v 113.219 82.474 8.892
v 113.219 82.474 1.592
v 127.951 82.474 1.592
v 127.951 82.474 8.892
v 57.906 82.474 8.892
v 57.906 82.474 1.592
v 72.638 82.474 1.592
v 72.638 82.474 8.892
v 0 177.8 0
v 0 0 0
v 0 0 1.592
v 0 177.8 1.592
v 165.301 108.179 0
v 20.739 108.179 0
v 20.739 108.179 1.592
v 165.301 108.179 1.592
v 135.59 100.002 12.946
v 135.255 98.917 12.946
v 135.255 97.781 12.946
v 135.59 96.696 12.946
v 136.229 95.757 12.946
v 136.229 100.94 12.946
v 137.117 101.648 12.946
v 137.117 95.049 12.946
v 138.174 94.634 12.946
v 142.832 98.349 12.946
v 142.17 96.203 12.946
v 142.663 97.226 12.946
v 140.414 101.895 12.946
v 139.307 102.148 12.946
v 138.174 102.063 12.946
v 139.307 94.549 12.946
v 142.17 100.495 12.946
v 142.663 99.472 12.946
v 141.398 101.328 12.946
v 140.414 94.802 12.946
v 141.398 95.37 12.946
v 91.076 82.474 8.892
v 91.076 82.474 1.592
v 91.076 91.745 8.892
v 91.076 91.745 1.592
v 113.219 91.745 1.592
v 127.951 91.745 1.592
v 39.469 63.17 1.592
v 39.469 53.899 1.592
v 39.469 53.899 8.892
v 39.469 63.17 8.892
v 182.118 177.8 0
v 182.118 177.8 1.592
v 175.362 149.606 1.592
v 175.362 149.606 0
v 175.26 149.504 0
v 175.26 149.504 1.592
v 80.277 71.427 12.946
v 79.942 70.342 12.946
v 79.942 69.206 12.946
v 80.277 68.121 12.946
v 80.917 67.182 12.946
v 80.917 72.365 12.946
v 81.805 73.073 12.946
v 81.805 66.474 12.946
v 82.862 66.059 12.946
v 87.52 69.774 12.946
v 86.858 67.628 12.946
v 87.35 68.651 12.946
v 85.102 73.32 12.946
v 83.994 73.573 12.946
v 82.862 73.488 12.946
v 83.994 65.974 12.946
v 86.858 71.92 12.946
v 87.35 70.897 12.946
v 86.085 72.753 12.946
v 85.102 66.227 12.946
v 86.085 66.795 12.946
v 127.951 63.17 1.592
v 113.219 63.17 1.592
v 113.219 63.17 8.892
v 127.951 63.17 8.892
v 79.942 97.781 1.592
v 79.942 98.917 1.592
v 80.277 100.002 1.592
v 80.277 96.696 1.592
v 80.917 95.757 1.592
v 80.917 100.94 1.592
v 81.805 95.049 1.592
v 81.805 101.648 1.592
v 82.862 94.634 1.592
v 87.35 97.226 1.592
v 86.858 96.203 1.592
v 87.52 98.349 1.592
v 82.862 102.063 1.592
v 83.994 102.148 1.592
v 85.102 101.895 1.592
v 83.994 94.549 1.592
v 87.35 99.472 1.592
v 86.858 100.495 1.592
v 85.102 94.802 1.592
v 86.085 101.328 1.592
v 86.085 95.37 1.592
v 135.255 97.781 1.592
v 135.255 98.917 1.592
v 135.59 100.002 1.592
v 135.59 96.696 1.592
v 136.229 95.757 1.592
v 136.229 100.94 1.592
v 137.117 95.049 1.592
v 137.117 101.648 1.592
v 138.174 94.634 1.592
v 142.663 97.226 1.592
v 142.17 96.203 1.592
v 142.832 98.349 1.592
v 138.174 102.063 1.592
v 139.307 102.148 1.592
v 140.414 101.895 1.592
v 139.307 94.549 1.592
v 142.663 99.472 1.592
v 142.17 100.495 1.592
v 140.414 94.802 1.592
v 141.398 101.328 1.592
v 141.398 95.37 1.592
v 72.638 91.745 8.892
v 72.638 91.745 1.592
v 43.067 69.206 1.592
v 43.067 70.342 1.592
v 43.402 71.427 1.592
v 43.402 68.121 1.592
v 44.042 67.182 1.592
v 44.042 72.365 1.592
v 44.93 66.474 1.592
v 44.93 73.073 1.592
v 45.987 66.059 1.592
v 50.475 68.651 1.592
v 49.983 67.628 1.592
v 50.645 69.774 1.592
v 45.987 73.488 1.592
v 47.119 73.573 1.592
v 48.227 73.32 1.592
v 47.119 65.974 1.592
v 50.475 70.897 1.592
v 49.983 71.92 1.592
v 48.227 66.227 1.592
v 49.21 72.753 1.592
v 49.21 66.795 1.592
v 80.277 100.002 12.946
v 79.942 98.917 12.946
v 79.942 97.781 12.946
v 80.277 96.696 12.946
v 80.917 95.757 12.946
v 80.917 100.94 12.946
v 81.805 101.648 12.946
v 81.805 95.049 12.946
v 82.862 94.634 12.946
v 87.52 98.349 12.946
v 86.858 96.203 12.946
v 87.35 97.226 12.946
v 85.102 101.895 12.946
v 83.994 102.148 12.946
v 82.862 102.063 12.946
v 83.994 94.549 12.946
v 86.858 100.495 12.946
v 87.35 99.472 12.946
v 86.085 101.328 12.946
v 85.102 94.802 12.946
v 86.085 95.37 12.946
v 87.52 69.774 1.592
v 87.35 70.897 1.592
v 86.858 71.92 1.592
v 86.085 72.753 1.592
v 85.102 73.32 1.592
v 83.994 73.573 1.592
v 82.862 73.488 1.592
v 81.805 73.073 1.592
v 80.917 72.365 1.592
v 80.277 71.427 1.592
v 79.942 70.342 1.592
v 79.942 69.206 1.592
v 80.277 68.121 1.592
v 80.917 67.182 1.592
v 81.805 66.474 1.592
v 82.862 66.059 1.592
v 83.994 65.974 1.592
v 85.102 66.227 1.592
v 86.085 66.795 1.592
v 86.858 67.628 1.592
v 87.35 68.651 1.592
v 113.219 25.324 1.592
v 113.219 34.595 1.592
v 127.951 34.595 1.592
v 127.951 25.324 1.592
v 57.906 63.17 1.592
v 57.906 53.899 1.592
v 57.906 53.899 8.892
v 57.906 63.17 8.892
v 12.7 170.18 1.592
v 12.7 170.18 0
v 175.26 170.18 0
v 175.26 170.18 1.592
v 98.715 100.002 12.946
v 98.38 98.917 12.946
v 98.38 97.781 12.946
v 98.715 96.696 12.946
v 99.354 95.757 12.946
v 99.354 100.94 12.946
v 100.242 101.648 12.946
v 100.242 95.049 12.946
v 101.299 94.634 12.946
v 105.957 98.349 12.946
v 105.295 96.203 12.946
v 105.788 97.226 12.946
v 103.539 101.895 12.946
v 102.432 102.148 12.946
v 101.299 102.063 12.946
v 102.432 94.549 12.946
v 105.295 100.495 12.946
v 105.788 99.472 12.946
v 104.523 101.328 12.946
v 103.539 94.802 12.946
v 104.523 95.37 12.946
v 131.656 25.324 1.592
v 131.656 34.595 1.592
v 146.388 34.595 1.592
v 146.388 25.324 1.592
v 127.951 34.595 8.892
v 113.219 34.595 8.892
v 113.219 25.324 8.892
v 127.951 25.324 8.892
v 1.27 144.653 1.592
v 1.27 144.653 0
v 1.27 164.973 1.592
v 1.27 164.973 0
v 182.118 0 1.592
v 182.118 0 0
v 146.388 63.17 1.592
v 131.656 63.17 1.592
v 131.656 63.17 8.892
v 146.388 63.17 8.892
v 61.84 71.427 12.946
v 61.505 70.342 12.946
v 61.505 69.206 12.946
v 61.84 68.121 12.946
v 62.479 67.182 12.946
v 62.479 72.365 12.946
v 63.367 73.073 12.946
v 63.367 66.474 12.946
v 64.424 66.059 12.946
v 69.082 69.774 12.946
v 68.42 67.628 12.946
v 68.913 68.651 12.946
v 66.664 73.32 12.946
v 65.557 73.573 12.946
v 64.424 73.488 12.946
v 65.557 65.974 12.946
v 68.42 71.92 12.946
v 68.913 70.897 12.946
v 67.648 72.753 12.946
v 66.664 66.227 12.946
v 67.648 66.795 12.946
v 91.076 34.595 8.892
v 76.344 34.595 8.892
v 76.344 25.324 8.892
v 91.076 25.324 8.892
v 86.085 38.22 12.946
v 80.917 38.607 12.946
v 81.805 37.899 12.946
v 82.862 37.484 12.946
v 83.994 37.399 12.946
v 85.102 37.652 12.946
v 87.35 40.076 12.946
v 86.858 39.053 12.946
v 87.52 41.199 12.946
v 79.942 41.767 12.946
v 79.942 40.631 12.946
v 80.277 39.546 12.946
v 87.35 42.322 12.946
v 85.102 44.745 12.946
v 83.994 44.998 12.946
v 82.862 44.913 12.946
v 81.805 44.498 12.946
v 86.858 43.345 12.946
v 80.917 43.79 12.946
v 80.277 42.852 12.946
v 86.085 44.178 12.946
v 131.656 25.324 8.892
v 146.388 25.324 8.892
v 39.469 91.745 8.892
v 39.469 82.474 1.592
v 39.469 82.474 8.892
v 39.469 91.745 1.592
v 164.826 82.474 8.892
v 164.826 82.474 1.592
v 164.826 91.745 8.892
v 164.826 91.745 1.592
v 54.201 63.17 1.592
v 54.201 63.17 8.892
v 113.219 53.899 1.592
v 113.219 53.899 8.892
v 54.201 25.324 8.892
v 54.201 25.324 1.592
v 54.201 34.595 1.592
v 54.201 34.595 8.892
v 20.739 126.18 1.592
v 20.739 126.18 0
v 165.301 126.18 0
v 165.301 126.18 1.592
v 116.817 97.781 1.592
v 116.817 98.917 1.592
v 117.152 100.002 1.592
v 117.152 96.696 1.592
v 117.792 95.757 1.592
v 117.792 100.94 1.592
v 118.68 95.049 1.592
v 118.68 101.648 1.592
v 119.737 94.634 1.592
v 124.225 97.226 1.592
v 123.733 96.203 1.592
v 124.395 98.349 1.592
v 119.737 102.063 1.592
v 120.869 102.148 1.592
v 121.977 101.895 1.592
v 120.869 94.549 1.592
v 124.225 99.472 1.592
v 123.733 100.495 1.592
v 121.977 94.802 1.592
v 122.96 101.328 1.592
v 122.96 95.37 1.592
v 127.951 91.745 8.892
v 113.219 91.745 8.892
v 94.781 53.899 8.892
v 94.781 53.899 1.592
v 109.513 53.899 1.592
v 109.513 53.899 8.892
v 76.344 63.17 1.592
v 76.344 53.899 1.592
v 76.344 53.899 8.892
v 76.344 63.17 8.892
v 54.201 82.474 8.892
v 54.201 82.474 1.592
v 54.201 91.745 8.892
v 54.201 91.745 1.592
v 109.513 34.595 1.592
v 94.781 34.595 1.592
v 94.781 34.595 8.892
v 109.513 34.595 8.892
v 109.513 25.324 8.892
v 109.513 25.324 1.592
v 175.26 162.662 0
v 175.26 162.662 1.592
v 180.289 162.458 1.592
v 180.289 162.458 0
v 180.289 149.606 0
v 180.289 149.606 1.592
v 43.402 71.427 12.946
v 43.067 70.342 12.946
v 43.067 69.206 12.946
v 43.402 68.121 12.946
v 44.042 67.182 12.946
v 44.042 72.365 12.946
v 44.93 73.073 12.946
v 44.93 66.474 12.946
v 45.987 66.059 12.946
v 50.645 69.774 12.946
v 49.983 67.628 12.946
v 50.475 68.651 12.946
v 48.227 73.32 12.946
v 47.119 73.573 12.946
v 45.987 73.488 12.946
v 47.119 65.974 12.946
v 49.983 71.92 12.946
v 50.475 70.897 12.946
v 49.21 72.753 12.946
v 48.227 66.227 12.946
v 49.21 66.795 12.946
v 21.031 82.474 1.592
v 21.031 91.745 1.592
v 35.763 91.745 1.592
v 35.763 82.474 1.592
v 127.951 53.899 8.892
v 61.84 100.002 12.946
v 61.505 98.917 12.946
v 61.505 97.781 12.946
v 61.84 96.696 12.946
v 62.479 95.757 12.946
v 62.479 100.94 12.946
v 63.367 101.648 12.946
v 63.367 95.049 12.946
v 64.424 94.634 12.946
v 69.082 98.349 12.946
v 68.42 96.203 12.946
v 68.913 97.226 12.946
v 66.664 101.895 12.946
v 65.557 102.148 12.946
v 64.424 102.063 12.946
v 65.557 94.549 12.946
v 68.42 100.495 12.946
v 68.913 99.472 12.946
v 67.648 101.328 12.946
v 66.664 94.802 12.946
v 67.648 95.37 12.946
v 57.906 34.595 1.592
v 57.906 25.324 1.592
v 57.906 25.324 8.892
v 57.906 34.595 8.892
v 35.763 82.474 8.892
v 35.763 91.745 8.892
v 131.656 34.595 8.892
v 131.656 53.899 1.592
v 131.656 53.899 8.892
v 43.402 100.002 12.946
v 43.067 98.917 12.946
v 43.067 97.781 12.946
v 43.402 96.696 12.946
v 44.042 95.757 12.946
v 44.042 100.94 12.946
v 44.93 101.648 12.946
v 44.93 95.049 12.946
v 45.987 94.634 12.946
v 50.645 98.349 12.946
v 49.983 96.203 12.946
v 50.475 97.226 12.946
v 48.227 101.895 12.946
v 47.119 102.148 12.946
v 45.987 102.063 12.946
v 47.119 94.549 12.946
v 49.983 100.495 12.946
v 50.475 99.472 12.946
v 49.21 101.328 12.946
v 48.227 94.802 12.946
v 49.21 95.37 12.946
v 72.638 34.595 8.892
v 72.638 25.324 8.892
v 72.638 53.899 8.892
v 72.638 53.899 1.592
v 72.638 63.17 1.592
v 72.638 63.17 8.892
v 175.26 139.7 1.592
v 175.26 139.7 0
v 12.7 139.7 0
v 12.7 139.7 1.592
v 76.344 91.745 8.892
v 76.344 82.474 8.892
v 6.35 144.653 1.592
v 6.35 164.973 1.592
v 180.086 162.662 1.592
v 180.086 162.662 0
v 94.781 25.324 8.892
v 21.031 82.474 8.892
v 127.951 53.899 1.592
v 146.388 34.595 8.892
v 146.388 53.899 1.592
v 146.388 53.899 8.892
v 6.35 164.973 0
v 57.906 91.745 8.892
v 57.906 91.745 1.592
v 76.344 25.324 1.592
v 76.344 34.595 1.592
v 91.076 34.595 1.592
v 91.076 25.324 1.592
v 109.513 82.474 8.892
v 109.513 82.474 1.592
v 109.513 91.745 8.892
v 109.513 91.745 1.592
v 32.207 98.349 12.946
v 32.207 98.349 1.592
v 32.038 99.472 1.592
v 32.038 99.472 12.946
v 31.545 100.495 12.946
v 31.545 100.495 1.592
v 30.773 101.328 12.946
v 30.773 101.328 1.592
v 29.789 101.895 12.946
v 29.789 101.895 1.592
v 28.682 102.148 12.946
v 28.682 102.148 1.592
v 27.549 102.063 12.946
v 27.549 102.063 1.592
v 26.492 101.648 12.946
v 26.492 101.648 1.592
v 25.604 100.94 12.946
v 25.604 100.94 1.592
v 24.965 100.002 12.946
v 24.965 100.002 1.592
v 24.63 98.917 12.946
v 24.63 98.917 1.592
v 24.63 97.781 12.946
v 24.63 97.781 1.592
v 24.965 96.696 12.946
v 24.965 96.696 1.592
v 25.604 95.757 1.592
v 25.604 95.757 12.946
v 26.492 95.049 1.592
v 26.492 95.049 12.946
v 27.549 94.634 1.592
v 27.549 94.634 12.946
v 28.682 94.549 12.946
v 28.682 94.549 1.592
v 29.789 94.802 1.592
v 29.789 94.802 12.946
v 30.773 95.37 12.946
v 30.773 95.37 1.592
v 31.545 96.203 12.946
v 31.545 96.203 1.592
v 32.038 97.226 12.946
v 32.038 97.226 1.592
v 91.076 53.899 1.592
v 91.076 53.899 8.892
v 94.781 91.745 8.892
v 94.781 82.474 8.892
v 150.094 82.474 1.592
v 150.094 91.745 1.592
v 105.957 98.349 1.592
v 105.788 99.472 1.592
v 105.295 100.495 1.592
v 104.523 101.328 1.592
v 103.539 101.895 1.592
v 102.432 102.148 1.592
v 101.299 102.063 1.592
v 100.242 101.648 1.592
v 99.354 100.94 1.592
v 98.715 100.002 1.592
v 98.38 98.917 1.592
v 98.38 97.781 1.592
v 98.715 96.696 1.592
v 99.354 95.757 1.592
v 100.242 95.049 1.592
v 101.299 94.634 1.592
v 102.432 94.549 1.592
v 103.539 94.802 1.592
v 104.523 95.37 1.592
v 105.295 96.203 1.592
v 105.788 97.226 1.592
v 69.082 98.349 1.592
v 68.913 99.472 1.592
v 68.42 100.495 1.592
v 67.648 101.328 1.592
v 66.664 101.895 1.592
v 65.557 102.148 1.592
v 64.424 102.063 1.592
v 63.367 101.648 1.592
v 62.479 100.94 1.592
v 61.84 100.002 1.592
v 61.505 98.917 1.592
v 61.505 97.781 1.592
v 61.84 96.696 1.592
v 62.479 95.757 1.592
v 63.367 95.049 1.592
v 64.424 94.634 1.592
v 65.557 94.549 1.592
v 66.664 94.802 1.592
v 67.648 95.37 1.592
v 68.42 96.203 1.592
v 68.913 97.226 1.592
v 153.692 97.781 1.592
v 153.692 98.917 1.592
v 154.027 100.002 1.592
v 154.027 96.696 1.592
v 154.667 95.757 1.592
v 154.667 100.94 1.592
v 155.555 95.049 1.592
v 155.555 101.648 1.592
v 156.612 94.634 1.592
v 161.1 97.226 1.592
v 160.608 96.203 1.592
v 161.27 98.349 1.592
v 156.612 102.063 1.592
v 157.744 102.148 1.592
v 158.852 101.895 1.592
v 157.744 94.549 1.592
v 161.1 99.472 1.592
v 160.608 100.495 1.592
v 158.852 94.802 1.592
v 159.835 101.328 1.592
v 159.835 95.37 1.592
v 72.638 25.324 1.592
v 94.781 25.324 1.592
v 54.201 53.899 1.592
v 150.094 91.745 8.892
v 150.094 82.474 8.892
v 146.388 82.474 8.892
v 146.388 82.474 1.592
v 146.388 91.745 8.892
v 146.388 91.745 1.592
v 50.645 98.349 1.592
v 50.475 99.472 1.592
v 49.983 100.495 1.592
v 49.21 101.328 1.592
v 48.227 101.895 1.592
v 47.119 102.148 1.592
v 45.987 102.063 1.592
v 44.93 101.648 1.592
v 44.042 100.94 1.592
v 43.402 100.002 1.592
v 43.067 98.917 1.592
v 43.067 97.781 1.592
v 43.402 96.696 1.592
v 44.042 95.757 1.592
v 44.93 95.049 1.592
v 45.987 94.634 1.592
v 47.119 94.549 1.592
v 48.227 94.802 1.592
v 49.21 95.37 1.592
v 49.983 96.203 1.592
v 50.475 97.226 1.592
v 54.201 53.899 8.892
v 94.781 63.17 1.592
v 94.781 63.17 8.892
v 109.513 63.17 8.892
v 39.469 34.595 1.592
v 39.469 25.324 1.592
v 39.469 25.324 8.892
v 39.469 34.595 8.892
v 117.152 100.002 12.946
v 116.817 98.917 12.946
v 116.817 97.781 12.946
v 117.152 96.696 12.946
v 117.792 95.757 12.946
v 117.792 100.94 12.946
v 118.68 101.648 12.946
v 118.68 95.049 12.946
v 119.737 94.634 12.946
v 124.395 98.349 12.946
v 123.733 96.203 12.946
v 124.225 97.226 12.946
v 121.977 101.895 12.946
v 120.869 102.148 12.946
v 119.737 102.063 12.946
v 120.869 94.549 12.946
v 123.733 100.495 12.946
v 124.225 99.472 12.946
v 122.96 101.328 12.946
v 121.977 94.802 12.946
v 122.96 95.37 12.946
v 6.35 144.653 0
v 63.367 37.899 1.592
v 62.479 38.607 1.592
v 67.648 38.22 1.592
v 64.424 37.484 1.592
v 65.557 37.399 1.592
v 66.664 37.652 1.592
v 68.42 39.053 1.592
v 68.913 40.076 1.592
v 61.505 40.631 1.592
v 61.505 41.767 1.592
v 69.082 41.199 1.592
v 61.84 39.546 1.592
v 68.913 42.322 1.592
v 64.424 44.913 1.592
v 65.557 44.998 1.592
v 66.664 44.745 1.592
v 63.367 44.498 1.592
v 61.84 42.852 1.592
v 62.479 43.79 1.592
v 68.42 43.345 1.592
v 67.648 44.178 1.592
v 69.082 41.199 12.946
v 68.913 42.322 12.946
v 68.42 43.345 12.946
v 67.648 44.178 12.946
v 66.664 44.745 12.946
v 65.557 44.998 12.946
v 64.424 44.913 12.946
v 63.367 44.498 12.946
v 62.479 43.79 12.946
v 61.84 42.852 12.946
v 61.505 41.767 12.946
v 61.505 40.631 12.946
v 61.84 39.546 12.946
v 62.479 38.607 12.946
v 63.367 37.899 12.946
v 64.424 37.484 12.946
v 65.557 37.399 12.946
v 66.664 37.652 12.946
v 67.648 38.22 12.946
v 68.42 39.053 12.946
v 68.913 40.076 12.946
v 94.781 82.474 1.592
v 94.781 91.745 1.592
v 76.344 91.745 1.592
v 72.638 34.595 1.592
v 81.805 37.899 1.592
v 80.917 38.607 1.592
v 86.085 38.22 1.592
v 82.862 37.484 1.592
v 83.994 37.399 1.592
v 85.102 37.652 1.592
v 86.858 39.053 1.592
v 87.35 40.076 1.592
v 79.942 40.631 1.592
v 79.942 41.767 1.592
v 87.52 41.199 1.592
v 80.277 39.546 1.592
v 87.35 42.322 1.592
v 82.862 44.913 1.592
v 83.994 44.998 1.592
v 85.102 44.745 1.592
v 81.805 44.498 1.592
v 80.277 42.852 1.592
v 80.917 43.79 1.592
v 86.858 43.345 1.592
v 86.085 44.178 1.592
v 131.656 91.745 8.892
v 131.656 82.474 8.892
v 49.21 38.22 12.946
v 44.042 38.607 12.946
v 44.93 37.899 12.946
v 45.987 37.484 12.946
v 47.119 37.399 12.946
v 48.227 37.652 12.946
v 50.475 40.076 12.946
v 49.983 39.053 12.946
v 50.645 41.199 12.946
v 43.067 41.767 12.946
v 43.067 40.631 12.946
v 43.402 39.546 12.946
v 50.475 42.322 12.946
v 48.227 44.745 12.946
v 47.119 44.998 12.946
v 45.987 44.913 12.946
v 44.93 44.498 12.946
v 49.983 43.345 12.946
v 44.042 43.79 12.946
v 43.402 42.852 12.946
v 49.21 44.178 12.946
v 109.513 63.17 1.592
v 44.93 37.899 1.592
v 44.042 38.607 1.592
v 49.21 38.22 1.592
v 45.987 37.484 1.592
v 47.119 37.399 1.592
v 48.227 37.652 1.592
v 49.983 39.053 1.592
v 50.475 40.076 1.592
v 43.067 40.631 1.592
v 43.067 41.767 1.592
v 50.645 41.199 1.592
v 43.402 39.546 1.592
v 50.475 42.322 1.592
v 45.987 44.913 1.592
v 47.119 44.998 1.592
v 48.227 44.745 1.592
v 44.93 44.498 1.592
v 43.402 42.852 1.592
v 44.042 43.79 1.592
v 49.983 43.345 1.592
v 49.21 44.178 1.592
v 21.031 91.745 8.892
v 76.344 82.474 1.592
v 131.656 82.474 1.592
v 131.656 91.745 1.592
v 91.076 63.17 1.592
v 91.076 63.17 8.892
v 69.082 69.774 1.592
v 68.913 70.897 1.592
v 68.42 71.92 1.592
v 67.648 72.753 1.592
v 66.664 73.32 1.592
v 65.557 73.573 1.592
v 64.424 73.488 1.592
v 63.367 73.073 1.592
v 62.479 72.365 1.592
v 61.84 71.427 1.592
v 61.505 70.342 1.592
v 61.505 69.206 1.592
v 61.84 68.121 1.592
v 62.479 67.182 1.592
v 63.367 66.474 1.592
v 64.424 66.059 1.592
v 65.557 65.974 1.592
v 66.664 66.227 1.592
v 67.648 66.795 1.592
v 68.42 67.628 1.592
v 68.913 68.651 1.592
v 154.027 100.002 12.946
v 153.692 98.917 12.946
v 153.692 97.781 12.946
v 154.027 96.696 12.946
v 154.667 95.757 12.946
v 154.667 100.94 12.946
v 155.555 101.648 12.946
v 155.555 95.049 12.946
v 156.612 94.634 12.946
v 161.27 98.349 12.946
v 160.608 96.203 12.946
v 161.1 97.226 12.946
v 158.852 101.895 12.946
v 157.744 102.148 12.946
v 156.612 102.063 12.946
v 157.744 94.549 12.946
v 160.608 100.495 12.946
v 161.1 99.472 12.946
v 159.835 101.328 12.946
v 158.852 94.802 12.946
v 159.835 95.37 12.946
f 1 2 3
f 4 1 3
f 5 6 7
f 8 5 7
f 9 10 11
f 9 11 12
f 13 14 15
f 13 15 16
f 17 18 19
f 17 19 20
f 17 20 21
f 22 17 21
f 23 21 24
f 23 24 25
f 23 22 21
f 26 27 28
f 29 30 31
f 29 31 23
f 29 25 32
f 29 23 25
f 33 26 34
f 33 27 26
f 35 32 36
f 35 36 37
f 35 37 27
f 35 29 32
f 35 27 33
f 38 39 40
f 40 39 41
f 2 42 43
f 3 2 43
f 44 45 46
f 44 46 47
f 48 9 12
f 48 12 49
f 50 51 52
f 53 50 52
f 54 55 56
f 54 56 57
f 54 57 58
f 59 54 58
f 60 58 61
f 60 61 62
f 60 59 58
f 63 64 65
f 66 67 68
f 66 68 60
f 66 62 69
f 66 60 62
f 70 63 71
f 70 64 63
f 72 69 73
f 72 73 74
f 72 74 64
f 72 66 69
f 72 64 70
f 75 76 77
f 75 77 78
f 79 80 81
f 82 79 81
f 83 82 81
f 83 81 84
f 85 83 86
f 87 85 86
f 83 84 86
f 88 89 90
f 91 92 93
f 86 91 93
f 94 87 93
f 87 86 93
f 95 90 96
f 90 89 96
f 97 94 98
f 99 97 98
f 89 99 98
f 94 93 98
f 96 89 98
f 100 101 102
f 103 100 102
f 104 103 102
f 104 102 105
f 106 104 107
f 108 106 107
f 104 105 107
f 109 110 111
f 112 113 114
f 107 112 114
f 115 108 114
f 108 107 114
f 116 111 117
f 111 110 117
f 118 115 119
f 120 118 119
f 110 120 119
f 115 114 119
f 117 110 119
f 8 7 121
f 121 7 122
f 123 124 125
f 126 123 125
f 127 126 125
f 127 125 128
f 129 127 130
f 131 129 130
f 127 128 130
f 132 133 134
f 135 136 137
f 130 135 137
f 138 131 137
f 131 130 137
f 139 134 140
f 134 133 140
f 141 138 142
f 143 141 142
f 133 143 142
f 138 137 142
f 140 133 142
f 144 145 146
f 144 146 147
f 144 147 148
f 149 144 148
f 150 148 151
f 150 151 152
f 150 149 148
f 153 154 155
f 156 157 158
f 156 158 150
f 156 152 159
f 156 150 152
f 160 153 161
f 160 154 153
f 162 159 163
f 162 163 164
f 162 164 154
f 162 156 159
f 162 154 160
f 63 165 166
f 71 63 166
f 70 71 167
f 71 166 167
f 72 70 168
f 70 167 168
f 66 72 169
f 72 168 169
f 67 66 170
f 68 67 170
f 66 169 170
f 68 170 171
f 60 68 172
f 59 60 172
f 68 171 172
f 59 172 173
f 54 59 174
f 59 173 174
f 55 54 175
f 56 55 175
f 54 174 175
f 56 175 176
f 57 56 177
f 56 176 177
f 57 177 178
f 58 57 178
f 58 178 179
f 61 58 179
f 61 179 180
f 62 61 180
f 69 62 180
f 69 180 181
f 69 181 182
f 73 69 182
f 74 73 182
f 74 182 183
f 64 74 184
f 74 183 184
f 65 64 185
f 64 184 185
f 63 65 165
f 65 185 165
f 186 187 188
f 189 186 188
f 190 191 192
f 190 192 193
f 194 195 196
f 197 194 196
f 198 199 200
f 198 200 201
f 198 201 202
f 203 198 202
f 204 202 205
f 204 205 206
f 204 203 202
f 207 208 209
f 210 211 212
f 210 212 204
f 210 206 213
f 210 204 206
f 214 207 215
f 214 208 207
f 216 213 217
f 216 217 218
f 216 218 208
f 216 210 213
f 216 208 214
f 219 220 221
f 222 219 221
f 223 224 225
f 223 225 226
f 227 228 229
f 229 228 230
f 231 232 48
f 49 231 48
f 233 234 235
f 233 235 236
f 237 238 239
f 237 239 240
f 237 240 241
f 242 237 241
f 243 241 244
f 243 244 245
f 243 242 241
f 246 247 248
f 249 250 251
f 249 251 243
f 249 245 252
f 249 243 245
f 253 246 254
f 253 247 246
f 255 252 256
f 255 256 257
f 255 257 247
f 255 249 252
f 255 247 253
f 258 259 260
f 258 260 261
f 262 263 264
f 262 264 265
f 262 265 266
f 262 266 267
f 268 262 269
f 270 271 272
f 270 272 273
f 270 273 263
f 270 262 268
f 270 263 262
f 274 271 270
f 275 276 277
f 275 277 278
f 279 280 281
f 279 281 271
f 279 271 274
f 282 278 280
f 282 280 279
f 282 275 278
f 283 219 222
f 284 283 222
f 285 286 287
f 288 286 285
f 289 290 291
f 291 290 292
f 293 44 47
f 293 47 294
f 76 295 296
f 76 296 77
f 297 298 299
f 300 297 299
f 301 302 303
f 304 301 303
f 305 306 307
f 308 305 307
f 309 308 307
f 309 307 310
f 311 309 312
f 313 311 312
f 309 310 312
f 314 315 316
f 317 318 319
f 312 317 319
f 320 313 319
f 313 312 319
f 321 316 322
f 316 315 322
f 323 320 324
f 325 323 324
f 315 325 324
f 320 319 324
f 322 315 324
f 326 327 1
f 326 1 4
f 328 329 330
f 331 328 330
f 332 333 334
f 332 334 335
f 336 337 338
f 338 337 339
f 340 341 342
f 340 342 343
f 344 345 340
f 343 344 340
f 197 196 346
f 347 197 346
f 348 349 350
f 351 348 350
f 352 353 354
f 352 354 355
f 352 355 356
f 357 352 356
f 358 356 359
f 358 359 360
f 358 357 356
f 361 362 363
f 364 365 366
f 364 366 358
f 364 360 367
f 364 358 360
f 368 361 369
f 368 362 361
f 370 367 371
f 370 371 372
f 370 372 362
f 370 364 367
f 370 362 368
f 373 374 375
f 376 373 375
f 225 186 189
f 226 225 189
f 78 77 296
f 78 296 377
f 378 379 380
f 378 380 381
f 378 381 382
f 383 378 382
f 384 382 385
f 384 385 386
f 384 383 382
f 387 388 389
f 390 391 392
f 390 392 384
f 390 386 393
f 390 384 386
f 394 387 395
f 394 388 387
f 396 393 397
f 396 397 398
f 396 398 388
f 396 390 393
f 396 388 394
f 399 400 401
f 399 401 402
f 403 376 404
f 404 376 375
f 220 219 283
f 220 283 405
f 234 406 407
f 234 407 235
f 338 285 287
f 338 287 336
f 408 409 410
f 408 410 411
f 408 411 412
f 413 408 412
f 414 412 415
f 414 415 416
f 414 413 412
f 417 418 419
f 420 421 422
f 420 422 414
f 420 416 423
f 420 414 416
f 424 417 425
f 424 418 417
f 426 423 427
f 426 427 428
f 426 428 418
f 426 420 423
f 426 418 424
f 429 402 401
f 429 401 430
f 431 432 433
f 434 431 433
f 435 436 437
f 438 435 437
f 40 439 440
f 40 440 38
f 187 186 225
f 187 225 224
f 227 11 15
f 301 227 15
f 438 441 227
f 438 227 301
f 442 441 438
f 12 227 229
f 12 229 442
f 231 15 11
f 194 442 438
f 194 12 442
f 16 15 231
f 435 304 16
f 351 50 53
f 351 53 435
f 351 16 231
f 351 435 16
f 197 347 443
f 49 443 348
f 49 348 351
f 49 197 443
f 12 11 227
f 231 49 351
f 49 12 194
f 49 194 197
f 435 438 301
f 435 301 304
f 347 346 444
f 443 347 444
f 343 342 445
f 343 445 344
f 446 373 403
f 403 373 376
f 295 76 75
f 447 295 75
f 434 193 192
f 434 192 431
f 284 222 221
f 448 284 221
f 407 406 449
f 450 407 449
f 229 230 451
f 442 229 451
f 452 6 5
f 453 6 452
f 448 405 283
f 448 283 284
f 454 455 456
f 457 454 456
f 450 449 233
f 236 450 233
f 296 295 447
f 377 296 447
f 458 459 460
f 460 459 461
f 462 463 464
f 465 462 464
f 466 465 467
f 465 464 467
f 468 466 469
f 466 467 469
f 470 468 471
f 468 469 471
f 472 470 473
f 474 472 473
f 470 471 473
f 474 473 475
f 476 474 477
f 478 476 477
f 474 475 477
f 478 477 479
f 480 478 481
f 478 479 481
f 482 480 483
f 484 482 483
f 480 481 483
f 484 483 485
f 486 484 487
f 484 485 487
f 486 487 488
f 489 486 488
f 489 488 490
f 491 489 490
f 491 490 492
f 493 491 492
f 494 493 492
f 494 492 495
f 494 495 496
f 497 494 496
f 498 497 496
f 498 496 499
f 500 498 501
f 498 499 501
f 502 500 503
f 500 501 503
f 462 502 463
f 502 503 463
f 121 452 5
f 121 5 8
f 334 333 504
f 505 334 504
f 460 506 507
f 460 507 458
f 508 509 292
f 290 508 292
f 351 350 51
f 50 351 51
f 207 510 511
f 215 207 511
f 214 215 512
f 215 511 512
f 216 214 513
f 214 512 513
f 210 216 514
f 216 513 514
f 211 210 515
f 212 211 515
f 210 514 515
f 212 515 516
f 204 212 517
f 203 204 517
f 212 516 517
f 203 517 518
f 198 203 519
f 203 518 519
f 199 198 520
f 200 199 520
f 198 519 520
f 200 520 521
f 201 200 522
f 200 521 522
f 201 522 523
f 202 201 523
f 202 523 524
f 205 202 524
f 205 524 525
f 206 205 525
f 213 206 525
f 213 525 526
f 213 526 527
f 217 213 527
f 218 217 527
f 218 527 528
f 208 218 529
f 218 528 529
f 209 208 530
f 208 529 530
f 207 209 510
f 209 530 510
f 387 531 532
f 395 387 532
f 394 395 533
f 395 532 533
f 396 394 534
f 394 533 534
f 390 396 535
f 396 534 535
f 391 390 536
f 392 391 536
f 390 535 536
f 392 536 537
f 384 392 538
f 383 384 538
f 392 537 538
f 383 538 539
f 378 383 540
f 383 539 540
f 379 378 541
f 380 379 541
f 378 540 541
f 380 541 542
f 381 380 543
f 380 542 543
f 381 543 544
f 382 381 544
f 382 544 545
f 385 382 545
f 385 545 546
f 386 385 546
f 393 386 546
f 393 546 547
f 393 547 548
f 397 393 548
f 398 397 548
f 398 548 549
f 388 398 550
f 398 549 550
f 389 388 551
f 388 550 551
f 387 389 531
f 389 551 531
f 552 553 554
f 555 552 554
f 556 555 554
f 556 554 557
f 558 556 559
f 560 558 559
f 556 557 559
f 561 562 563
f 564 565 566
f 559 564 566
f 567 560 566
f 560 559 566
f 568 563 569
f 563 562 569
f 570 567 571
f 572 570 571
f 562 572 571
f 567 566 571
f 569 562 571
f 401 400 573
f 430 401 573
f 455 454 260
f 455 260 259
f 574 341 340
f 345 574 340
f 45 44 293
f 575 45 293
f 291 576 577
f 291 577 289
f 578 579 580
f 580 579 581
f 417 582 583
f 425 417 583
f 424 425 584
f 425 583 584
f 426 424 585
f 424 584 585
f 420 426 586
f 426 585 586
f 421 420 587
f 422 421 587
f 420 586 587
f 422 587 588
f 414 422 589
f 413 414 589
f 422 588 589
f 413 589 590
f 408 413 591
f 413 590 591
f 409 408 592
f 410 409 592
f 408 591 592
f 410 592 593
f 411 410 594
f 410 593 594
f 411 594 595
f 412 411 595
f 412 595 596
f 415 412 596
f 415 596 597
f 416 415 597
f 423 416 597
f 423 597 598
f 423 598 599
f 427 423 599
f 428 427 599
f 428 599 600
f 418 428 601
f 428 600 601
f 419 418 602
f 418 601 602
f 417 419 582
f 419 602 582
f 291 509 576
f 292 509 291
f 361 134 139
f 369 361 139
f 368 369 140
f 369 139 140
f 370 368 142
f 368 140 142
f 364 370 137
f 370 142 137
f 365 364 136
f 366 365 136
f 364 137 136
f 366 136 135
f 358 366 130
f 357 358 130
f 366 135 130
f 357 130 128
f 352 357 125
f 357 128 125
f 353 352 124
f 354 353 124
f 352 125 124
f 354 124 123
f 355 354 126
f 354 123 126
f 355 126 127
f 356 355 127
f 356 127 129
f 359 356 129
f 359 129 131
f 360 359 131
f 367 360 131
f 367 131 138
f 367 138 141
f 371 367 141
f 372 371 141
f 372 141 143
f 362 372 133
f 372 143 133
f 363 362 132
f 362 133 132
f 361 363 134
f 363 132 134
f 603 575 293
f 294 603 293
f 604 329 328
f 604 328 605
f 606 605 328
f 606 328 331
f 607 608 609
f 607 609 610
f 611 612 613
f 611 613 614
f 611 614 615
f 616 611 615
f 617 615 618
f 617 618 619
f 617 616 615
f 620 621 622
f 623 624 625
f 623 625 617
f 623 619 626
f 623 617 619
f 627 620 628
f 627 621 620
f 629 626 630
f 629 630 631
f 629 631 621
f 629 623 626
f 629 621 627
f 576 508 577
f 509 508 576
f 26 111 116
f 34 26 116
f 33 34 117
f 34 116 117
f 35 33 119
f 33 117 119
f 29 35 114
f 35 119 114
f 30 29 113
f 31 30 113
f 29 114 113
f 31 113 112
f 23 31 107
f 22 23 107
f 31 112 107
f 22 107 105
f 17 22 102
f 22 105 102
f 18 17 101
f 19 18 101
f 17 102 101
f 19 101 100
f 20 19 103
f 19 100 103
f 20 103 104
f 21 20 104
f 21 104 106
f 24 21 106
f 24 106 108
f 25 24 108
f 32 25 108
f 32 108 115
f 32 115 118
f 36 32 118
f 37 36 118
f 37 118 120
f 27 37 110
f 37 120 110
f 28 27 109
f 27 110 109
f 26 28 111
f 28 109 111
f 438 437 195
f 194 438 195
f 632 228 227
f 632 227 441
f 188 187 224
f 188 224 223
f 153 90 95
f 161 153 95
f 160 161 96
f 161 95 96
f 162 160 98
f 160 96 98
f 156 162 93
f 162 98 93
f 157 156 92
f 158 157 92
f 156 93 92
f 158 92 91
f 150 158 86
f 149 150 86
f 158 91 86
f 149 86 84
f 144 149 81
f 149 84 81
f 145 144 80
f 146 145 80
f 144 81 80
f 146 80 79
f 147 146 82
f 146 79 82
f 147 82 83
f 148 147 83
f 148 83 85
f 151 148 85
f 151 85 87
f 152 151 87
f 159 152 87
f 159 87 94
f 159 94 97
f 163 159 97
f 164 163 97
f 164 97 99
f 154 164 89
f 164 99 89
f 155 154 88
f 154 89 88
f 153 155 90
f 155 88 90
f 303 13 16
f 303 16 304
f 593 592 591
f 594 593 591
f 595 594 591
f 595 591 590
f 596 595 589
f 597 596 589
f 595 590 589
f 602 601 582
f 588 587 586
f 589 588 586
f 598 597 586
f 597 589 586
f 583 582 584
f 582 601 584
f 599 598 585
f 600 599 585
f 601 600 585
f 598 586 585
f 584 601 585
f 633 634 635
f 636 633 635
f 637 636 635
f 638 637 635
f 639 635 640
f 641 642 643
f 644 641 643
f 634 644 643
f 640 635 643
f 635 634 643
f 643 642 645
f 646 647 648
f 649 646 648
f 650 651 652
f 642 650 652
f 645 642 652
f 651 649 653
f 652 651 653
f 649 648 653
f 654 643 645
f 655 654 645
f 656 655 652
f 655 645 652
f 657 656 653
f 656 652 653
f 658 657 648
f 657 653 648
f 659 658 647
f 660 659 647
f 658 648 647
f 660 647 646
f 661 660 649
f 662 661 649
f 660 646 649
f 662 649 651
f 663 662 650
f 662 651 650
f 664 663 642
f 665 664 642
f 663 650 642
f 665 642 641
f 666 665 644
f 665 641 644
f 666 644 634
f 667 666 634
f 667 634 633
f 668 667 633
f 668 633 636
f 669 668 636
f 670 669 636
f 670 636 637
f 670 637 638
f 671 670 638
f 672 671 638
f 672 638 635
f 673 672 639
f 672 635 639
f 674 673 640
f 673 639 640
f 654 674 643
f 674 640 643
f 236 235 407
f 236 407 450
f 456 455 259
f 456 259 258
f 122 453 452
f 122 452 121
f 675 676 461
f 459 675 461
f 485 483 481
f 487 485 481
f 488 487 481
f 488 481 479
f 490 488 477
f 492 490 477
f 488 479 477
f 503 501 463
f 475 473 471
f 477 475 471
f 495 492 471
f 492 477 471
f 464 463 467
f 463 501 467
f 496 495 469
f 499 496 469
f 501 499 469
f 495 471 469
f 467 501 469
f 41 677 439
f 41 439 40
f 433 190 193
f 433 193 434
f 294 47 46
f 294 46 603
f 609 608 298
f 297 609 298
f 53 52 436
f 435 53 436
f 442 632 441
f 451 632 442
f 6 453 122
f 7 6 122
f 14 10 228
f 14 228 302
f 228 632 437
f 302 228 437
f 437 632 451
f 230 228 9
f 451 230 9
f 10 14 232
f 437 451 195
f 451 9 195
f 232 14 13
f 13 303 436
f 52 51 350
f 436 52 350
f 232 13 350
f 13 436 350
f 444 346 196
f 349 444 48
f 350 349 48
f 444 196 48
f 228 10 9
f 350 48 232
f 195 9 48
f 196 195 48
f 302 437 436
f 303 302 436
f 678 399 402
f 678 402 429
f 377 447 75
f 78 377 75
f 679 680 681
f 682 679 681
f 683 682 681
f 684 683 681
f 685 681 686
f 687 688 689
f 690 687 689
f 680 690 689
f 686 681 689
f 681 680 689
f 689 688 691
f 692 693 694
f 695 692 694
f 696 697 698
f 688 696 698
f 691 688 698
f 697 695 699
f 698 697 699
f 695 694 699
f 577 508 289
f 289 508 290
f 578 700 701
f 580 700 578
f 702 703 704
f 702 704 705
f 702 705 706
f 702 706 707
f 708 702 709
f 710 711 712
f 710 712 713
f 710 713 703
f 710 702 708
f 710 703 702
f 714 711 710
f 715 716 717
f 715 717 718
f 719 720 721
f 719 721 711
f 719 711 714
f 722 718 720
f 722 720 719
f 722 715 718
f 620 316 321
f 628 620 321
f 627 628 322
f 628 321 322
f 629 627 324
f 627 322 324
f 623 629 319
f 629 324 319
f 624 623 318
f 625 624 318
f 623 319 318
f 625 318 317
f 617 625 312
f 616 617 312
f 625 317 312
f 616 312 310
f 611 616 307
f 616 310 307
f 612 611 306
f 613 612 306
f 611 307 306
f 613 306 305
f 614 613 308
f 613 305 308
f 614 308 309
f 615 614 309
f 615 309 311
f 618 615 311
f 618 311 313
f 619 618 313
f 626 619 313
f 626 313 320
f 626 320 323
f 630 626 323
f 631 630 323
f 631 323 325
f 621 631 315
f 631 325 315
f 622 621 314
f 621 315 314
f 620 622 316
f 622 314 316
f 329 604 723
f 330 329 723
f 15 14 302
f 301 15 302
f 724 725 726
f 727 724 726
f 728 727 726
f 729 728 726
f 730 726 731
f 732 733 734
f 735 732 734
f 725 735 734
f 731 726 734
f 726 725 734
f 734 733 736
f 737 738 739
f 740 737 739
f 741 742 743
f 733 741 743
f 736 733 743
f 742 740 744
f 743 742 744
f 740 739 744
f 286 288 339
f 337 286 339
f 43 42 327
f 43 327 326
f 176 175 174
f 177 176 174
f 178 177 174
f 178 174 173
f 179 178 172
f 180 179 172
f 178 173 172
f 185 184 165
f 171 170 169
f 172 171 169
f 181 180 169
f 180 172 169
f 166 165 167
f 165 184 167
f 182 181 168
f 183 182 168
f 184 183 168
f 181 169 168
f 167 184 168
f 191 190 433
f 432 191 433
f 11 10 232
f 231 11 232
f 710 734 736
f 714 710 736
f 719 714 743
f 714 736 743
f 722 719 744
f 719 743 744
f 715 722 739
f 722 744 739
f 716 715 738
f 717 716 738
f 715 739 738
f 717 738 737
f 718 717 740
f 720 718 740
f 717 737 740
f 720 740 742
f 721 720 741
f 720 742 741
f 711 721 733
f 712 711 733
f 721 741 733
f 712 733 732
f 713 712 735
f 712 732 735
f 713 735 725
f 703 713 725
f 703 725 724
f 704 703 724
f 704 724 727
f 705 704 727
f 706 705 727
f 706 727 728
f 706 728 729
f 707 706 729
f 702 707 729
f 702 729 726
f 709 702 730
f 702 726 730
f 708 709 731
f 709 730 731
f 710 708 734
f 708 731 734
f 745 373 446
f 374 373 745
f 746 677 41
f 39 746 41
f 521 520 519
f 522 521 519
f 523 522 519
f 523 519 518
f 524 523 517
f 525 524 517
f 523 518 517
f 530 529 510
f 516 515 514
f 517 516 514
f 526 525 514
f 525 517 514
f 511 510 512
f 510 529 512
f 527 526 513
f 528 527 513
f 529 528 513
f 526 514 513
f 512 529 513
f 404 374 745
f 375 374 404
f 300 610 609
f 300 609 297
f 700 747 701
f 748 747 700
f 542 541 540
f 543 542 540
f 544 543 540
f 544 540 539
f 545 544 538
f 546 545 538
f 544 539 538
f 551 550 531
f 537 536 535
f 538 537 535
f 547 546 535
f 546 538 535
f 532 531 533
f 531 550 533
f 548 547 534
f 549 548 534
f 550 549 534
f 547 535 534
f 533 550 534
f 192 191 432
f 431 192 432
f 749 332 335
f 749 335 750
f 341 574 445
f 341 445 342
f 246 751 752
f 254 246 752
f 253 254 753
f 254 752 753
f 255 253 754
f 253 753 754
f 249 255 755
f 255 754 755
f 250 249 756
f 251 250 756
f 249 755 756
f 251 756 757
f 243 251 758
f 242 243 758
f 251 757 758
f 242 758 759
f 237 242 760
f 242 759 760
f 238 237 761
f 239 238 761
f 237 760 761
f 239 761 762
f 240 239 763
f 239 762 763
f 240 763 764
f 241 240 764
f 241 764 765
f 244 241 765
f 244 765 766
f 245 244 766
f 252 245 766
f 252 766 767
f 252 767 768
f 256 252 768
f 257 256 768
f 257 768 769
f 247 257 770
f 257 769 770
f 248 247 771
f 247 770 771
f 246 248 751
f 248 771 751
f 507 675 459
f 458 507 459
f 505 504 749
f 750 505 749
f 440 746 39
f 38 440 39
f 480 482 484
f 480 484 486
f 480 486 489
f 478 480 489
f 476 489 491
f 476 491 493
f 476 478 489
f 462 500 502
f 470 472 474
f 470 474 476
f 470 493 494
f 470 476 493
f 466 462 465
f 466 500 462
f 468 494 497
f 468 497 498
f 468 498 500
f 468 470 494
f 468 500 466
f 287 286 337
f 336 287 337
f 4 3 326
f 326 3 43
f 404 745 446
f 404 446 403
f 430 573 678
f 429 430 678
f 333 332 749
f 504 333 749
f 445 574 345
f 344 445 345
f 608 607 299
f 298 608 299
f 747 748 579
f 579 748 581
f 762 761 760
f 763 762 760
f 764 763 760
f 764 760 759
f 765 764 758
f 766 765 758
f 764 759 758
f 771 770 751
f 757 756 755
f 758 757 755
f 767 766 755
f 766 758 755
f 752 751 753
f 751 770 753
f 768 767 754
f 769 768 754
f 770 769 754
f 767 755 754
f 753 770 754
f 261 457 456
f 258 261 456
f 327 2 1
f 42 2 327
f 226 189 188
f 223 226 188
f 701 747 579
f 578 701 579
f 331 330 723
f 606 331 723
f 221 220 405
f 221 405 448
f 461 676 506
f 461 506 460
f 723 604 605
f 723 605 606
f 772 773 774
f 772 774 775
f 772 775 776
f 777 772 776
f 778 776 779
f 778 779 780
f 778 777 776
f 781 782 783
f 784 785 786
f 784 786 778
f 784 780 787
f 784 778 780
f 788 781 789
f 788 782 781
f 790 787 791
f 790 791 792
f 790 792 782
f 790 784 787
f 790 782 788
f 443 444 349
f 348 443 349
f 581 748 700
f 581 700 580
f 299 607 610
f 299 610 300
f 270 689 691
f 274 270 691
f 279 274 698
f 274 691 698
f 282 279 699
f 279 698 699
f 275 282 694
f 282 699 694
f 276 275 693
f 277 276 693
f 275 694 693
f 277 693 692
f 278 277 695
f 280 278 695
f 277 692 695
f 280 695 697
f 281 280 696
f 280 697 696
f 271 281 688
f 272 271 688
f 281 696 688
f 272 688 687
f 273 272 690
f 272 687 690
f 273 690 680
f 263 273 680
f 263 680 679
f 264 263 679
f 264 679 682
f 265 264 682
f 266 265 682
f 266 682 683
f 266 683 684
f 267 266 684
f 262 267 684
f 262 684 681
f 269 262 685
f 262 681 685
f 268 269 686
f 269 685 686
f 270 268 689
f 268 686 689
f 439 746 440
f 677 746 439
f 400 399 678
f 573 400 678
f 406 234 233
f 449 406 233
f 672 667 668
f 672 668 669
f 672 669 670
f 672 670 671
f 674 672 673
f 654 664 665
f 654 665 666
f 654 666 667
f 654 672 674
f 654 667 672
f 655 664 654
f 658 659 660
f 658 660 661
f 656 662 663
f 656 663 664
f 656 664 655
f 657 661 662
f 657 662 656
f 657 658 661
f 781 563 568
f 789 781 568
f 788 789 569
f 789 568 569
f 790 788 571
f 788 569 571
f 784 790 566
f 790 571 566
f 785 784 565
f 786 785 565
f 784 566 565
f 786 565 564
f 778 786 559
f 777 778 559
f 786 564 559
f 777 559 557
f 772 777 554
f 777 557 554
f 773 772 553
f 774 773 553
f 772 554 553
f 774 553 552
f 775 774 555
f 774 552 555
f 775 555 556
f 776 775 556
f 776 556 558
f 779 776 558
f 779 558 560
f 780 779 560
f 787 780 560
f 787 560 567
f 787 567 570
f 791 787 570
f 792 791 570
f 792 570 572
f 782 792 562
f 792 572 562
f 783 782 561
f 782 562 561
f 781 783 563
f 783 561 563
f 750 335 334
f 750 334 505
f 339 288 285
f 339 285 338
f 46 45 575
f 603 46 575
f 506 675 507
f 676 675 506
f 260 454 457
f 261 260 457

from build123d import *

# Parameters (mm, degrees)
SKETCH1_W                       = 182.118
SKETCH1_H                       = 177.8
SKETCH1_W_2                     = 144.56156
SKETCH1_H_2                     = 18.00098
SKETCH1_W_3                     = 5.08
SKETCH1_H_3                     = 20.32
BOARD_DEPTH                     = 1.592072
SKETCH2_R                       = 3.81
LED_KINGBRIGHT_3P_2P54_1_DEPTH  = 11.3538
SKETCH3_R                       = 3.81
LED_KINGBRIGHT_3P_2P54_2_DEPTH  = 11.3538
SKETCH4_R                       = 3.81
LED_KINGBRIGHT_3P_2P54_3_DEPTH  = 11.3538
SKETCH6_R                       = 3.81
LED_KINGBRIGHT_3P_2P54_5_DEPTH  = 11.3538
SKETCH7_R                       = 3.81
LED_KINGBRIGHT_3P_2P54_6_DEPTH  = 11.3538
SKETCH8_R                       = 3.81
LED_KINGBRIGHT_3P_2P54_7_DEPTH  = 11.3538
SKETCH10_R                      = 3.81
LED_KINGBRIGHT_3P_2P54_9_DEPTH  = 11.3538
SKETCH11_R                      = 3.81
LED_KINGBRIGHT_3P_2P54_10_DEPTH = 11.3538
SKETCH12_R                      = 3.81
LED_KINGBRIGHT_3P_2P54_11_DEPTH = 11.3538
SKETCH13_R                      = 3.81
LED_KINGBRIGHT_3P_2P54_12_DEPTH = 11.3538
SKETCH14_R                      = 3.81
LED_KINGBRIGHT_3P_2P54_13_DEPTH = 11.3538
SKETCH15_R                      = 3.81
LED_KINGBRIGHT_3P_2P54_14_DEPTH = 11.3538
SKETCH16_R                      = 3.81
LED_KINGBRIGHT_3P_2P54_15_DEPTH = 11.3538
SKETCH17_R                      = 3.81
LED_KINGBRIGHT_3P_2P54_16_DEPTH = 11.3538
SKETCH18_W                      = 14.732
SKETCH18_H                      = 9.271
SWITCH_MCDTS2_1_DEPTH           = 7.3000108
SKETCH19_W                      = 14.732
SKETCH19_H                      = 9.271
SWITCH_MCDTS2_2_DEPTH           = 7.3000108
SKETCH20_W                      = 14.732
SKETCH20_H                      = 9.271
SWITCH_MCDTS2_3_DEPTH           = 7.3000108
SKETCH21_W                      = 14.732
SKETCH21_H                      = 9.271
SWITCH_MCDTS2_4_DEPTH           = 7.3000108
SKETCH22_W                      = 14.732
SKETCH22_H                      = 9.271
SWITCH_MCDTS2_5_DEPTH           = 7.3000108
SKETCH23_W                      = 14.732
SKETCH23_H                      = 9.271
SWITCH_MCDTS2_6_DEPTH           = 7.3000108
SKETCH25_W                      = 14.732
SKETCH25_H                      = 9.271
SWITCH_MCDTS2_8_DEPTH           = 7.3000108
SKETCH26_W                      = 14.732
SKETCH26_H                      = 9.271
SWITCH_MCDTS2_9_DEPTH           = 7.3000108
SKETCH27_W                      = 14.732
SKETCH27_H                      = 9.271
SWITCH_MCDTS2_10_DEPTH          = 7.3000108
SKETCH28_W                      = 14.732
SKETCH28_H                      = 9.271
SWITCH_MCDTS2_11_DEPTH          = 7.3000108
SKETCH29_W                      = 14.732
SKETCH29_H                      = 9.271
SWITCH_MCDTS2_12_DEPTH          = 7.3000108
SKETCH30_W                      = 14.732
SKETCH30_H                      = 9.271
SWITCH_MCDTS2_13_DEPTH          = 7.3000108
SKETCH32_W                      = 14.732
SKETCH32_H                      = 9.271
SWITCH_MCDTS2_15_DEPTH          = 7.3000108
SKETCH33_W                      = 14.732
SKETCH33_H                      = 9.271
SWITCH_MCDTS2_16_DEPTH          = 7.3000108
SKETCH34_W                      = 14.732
SKETCH34_H                      = 9.271
SWITCH_MCDTS2_17_DEPTH          = 7.3000108
SKETCH35_W                      = 14.732
SKETCH35_H                      = 9.271
SWITCH_MCDTS2_18_DEPTH          = 7.3000108
SKETCH36_W                      = 14.732
SKETCH36_H                      = 9.271
SWITCH_MCDTS2_19_DEPTH          = 7.3000108
SKETCH37_W                      = 14.732
SKETCH37_H                      = 9.271
SWITCH_MCDTS2_20_DEPTH          = 7.3000108
SKETCH38_W                      = 14.732
SKETCH38_H                      = 9.271
SWITCH_MCDTS2_21_DEPTH          = 7.3000108
SKETCH39_W                      = 14.732
SKETCH39_H                      = 9.271
SWITCH_MCDTS2_22_DEPTH          = 7.3000108


with BuildPart() as part:
    # Sketch1 → BOARD (new body)
    with BuildSketch(Plane.XY):
        with Locations((91.059, 88.9)):
            Rectangle(SKETCH1_W, SKETCH1_H)
        with Locations((93.01988, 117.17909)):
            Rectangle(SKETCH1_W_2, SKETCH1_H_2, mode=Mode.SUBTRACT)
        with Locations((3.81, 154.813)):
            Rectangle(SKETCH1_W_3, SKETCH1_H_3, mode=Mode.SUBTRACT)
        Polygon((12.7, 139.7), (12.7, 170.18), (175.26, 170.18), (175.26, 162.6616), (180.086, 162.6616), (180.2892, 162.4584), (180.2892, 149.606), (175.3616, 149.606), (175.26, 149.5044), (175.26, 139.7), align=None, mode=Mode.SUBTRACT)
    extrude(amount=BOARD_DEPTH)


with BuildPart() as body_2:
    # Sketch2 → LED-KINGBRIGHT_3P_2P54-1 (new body)
    with BuildSketch(Plane.XY.offset(1.592072)):
        with Locations((83.7097132, 41.1988)):
            Circle(SKETCH2_R)
    extrude(amount=LED_KINGBRIGHT_3P_2P54_1_DEPTH)


with BuildPart() as body_3:
    # Sketch3 → LED-KINGBRIGHT_3P_2P54-2 (new body)
    with BuildSketch(Plane.XY.offset(1.592072)):
        with Locations((65.2722088, 41.1988)):
            Circle(SKETCH3_R)
    extrude(amount=LED_KINGBRIGHT_3P_2P54_2_DEPTH)


with BuildPart() as body_4:
    # Sketch4 → LED-KINGBRIGHT_3P_2P54-3 (new body)
    with BuildSketch(Plane.XY.offset(1.592072)):
        with Locations((46.8347044, 41.1988)):
            Circle(SKETCH4_R)
    extrude(amount=LED_KINGBRIGHT_3P_2P54_3_DEPTH)


with BuildPart() as body_5:
    # Sketch6 → LED-KINGBRIGHT_3P_2P54-5 (new body)
    with BuildSketch(Plane.XY.offset(1.592072)):
        with Locations((83.7097132, 69.7738)):
            Circle(SKETCH6_R)
    extrude(amount=LED_KINGBRIGHT_3P_2P54_5_DEPTH)


with BuildPart() as body_6:
    # Sketch7 → LED-KINGBRIGHT_3P_2P54-6 (new body)
    with BuildSketch(Plane.XY.offset(1.592072)):
        with Locations((65.2722088, 69.7738)):
            Circle(SKETCH7_R)
    extrude(amount=LED_KINGBRIGHT_3P_2P54_6_DEPTH)


with BuildPart() as body_7:
    # Sketch8 → LED-KINGBRIGHT_3P_2P54-7 (new body)
    with BuildSketch(Plane.XY.offset(1.592072)):
        with Locations((46.8347044, 69.7738)):
            Circle(SKETCH8_R)
    extrude(amount=LED_KINGBRIGHT_3P_2P54_7_DEPTH)


with BuildPart() as body_8:
    # Sketch10 → LED-KINGBRIGHT_3P_2P54-9 (new body)
    with BuildSketch(Plane.XY.offset(1.592072)):
        with Locations((157.4597308, 98.3488)):
            Circle(SKETCH10_R)
    extrude(amount=LED_KINGBRIGHT_3P_2P54_9_DEPTH)


with BuildPart() as body_9:
    # Sketch11 → LED-KINGBRIGHT_3P_2P54-10 (new body)
    with BuildSketch(Plane.XY.offset(1.592072)):
        with Locations((139.0222264, 98.3488)):
            Circle(SKETCH11_R)
    extrude(amount=LED_KINGBRIGHT_3P_2P54_10_DEPTH)


with BuildPart() as body_10:
    # Sketch12 → LED-KINGBRIGHT_3P_2P54-11 (new body)
    with BuildSketch(Plane.XY.offset(1.592072)):
        with Locations((120.584722, 98.3488)):
            Circle(SKETCH12_R)
    extrude(amount=LED_KINGBRIGHT_3P_2P54_11_DEPTH)


with BuildPart() as body_11:
    # Sketch13 → LED-KINGBRIGHT_3P_2P54-12 (new body)
    with BuildSketch(Plane.XY.offset(1.592072)):
        with Locations((102.1472176, 98.3488)):
            Circle(SKETCH13_R)
    extrude(amount=LED_KINGBRIGHT_3P_2P54_12_DEPTH)


with BuildPart() as body_12:
    # Sketch14 → LED-KINGBRIGHT_3P_2P54-13 (new body)
    with BuildSketch(Plane.XY.offset(1.592072)):
        with Locations((83.7097132, 98.3488)):
            Circle(SKETCH14_R)
    extrude(amount=LED_KINGBRIGHT_3P_2P54_13_DEPTH)


with BuildPart() as body_13:
    # Sketch15 → LED-KINGBRIGHT_3P_2P54-14 (new body)
    with BuildSketch(Plane.XY.offset(1.592072)):
        with Locations((65.2722088, 98.3488)):
            Circle(SKETCH15_R)
    extrude(amount=LED_KINGBRIGHT_3P_2P54_14_DEPTH)


with BuildPart() as body_14:
    # Sketch16 → LED-KINGBRIGHT_3P_2P54-15 (new body)
    with BuildSketch(Plane.XY.offset(1.592072)):
        with Locations((46.8347044, 98.3488)):
            Circle(SKETCH16_R)
    extrude(amount=LED_KINGBRIGHT_3P_2P54_15_DEPTH)


with BuildPart() as body_15:
    # Sketch17 → LED-KINGBRIGHT_3P_2P54-16 (new body)
    with BuildSketch(Plane.XY.offset(1.592072)):
        with Locations((28.3972, 98.3488)):
            Circle(SKETCH17_R)
    extrude(amount=LED_KINGBRIGHT_3P_2P54_16_DEPTH)


with BuildPart() as body_16:
    # Sketch18 → SWITCH-MCDTS2-1 (new body)
    with BuildSketch(Plane.XY.offset(1.592072)):
        with Locations((139.0222264, 29.9593)):
            Rectangle(SKETCH18_W, SKETCH18_H)
    extrude(amount=SWITCH_MCDTS2_1_DEPTH)


with BuildPart() as body_17:
    # Sketch19 → SWITCH-MCDTS2-2 (new body)
    with BuildSketch(Plane.XY.offset(1.592072)):
        with Locations((120.584722, 29.9593)):
            Rectangle(SKETCH19_W, SKETCH19_H)
    extrude(amount=SWITCH_MCDTS2_2_DEPTH)


with BuildPart() as body_18:
    # Sketch20 → SWITCH-MCDTS2-3 (new body)
    with BuildSketch(Plane.XY.offset(1.592072)):
        with Locations((102.1472176, 29.9593)):
            Rectangle(SKETCH20_W, SKETCH20_H)
    extrude(amount=SWITCH_MCDTS2_3_DEPTH)


with BuildPart() as body_19:
    # Sketch21 → SWITCH-MCDTS2-4 (new body)
    with BuildSketch(Plane.XY.offset(1.592072)):
        with Locations((83.7097132, 29.9593)):
            Rectangle(SKETCH21_W, SKETCH21_H)
    extrude(amount=SWITCH_MCDTS2_4_DEPTH)


with BuildPart() as body_20:
    # Sketch22 → SWITCH-MCDTS2-5 (new body)
    with BuildSketch(Plane.XY.offset(1.592072)):
        with Locations((65.2722088, 29.9593)):
            Rectangle(SKETCH22_W, SKETCH22_H)
    extrude(amount=SWITCH_MCDTS2_5_DEPTH)


with BuildPart() as body_21:
    # Sketch23 → SWITCH-MCDTS2-6 (new body)
    with BuildSketch(Plane.XY.offset(1.592072)):
        with Locations((46.8347044, 29.9593)):
            Rectangle(SKETCH23_W, SKETCH23_H)
    extrude(amount=SWITCH_MCDTS2_6_DEPTH)


with BuildPart() as body_22:
    # Sketch25 → SWITCH-MCDTS2-8 (new body)
    with BuildSketch(Plane.XY.offset(1.592072)):
        with Locations((139.0222264, 58.5343)):
            Rectangle(SKETCH25_W, SKETCH25_H)
    extrude(amount=SWITCH_MCDTS2_8_DEPTH)


with BuildPart() as body_23:
    # Sketch26 → SWITCH-MCDTS2-9 (new body)
    with BuildSketch(Plane.XY.offset(1.592072)):
        with Locations((120.584722, 58.5343)):
            Rectangle(SKETCH26_W, SKETCH26_H)
    extrude(amount=SWITCH_MCDTS2_9_DEPTH)


with BuildPart() as body_24:
    # Sketch27 → SWITCH-MCDTS2-10 (new body)
    with BuildSketch(Plane.XY.offset(1.592072)):
        with Locations((102.1472176, 58.5343)):
            Rectangle(SKETCH27_W, SKETCH27_H)
    extrude(amount=SWITCH_MCDTS2_10_DEPTH)


with BuildPart() as body_25:
    # Sketch28 → SWITCH-MCDTS2-11 (new body)
    with BuildSketch(Plane.XY.offset(1.592072)):
        with Locations((83.7097132, 58.5343)):
            Rectangle(SKETCH28_W, SKETCH28_H)
    extrude(amount=SWITCH_MCDTS2_11_DEPTH)


with BuildPart() as body_26:
    # Sketch29 → SWITCH-MCDTS2-12 (new body)
    with BuildSketch(Plane.XY.offset(1.592072)):
        with Locations((65.2722088, 58.5343)):
            Rectangle(SKETCH29_W, SKETCH29_H)
    extrude(amount=SWITCH_MCDTS2_12_DEPTH)


with BuildPart() as body_27:
    # Sketch30 → SWITCH-MCDTS2-13 (new body)
    with BuildSketch(Plane.XY.offset(1.592072)):
        with Locations((46.8347044, 58.5343)):
            Rectangle(SKETCH30_W, SKETCH30_H)
    extrude(amount=SWITCH_MCDTS2_13_DEPTH)


with BuildPart() as body_28:
    # Sketch32 → SWITCH-MCDTS2-15 (new body)
    with BuildSketch(Plane.XY.offset(1.592072)):
        with Locations((157.4597308, 87.1093)):
            Rectangle(SKETCH32_W, SKETCH32_H)
    extrude(amount=SWITCH_MCDTS2_15_DEPTH)


with BuildPart() as body_29:
    # Sketch33 → SWITCH-MCDTS2-16 (new body)
    with BuildSketch(Plane.XY.offset(1.592072)):
        with Locations((139.0222264, 87.1093)):
            Rectangle(SKETCH33_W, SKETCH33_H)
    extrude(amount=SWITCH_MCDTS2_16_DEPTH)


with BuildPart() as body_30:
    # Sketch34 → SWITCH-MCDTS2-17 (new body)
    with BuildSketch(Plane.XY.offset(1.592072)):
        with Locations((120.584722, 87.1093)):
            Rectangle(SKETCH34_W, SKETCH34_H)
    extrude(amount=SWITCH_MCDTS2_17_DEPTH)


with BuildPart() as body_31:
    # Sketch35 → SWITCH-MCDTS2-18 (new body)
    with BuildSketch(Plane.XY.offset(1.592072)):
        with Locations((102.1472176, 87.1093)):
            Rectangle(SKETCH35_W, SKETCH35_H)
    extrude(amount=SWITCH_MCDTS2_18_DEPTH)


with BuildPart() as body_32:
    # Sketch36 → SWITCH-MCDTS2-19 (new body)
    with BuildSketch(Plane.XY.offset(1.592072)):
        with Locations((83.7097132, 87.1093)):
            Rectangle(SKETCH36_W, SKETCH36_H)
    extrude(amount=SWITCH_MCDTS2_19_DEPTH)


with BuildPart() as body_33:
    # Sketch37 → SWITCH-MCDTS2-20 (new body)
    with BuildSketch(Plane.XY.offset(1.592072)):
        with Locations((65.2722088, 87.1093)):
            Rectangle(SKETCH37_W, SKETCH37_H)
    extrude(amount=SWITCH_MCDTS2_20_DEPTH)


with BuildPart() as body_34:
    # Sketch38 → SWITCH-MCDTS2-21 (new body)
    with BuildSketch(Plane.XY.offset(1.592072)):
        with Locations((46.8347044, 87.1093)):
            Rectangle(SKETCH38_W, SKETCH38_H)
    extrude(amount=SWITCH_MCDTS2_21_DEPTH)


with BuildPart() as body_35:
    # Sketch39 → SWITCH-MCDTS2-22 (new body)
    with BuildSketch(Plane.XY.offset(1.592072)):
        with Locations((28.3972, 87.1093)):
            Rectangle(SKETCH39_W, SKETCH39_H)
    extrude(amount=SWITCH_MCDTS2_22_DEPTH)


solid = Compound([part.part, body_2.part, body_3.part, body_4.part, body_5.part, body_6.part, body_7.part, body_8.part, body_9.part, body_10.part, body_11.part, body_12.part, body_13.part, body_14.part, body_15.part, body_16.part, body_17.part, body_18.part, body_19.part, body_20.part, body_21.part, body_22.part, body_23.part, body_24.part, body_25.part, body_26.part, body_27.part, body_28.part, body_29.part, body_30.part, body_31.part, body_32.part, body_33.part, body_34.part, body_35.part])
